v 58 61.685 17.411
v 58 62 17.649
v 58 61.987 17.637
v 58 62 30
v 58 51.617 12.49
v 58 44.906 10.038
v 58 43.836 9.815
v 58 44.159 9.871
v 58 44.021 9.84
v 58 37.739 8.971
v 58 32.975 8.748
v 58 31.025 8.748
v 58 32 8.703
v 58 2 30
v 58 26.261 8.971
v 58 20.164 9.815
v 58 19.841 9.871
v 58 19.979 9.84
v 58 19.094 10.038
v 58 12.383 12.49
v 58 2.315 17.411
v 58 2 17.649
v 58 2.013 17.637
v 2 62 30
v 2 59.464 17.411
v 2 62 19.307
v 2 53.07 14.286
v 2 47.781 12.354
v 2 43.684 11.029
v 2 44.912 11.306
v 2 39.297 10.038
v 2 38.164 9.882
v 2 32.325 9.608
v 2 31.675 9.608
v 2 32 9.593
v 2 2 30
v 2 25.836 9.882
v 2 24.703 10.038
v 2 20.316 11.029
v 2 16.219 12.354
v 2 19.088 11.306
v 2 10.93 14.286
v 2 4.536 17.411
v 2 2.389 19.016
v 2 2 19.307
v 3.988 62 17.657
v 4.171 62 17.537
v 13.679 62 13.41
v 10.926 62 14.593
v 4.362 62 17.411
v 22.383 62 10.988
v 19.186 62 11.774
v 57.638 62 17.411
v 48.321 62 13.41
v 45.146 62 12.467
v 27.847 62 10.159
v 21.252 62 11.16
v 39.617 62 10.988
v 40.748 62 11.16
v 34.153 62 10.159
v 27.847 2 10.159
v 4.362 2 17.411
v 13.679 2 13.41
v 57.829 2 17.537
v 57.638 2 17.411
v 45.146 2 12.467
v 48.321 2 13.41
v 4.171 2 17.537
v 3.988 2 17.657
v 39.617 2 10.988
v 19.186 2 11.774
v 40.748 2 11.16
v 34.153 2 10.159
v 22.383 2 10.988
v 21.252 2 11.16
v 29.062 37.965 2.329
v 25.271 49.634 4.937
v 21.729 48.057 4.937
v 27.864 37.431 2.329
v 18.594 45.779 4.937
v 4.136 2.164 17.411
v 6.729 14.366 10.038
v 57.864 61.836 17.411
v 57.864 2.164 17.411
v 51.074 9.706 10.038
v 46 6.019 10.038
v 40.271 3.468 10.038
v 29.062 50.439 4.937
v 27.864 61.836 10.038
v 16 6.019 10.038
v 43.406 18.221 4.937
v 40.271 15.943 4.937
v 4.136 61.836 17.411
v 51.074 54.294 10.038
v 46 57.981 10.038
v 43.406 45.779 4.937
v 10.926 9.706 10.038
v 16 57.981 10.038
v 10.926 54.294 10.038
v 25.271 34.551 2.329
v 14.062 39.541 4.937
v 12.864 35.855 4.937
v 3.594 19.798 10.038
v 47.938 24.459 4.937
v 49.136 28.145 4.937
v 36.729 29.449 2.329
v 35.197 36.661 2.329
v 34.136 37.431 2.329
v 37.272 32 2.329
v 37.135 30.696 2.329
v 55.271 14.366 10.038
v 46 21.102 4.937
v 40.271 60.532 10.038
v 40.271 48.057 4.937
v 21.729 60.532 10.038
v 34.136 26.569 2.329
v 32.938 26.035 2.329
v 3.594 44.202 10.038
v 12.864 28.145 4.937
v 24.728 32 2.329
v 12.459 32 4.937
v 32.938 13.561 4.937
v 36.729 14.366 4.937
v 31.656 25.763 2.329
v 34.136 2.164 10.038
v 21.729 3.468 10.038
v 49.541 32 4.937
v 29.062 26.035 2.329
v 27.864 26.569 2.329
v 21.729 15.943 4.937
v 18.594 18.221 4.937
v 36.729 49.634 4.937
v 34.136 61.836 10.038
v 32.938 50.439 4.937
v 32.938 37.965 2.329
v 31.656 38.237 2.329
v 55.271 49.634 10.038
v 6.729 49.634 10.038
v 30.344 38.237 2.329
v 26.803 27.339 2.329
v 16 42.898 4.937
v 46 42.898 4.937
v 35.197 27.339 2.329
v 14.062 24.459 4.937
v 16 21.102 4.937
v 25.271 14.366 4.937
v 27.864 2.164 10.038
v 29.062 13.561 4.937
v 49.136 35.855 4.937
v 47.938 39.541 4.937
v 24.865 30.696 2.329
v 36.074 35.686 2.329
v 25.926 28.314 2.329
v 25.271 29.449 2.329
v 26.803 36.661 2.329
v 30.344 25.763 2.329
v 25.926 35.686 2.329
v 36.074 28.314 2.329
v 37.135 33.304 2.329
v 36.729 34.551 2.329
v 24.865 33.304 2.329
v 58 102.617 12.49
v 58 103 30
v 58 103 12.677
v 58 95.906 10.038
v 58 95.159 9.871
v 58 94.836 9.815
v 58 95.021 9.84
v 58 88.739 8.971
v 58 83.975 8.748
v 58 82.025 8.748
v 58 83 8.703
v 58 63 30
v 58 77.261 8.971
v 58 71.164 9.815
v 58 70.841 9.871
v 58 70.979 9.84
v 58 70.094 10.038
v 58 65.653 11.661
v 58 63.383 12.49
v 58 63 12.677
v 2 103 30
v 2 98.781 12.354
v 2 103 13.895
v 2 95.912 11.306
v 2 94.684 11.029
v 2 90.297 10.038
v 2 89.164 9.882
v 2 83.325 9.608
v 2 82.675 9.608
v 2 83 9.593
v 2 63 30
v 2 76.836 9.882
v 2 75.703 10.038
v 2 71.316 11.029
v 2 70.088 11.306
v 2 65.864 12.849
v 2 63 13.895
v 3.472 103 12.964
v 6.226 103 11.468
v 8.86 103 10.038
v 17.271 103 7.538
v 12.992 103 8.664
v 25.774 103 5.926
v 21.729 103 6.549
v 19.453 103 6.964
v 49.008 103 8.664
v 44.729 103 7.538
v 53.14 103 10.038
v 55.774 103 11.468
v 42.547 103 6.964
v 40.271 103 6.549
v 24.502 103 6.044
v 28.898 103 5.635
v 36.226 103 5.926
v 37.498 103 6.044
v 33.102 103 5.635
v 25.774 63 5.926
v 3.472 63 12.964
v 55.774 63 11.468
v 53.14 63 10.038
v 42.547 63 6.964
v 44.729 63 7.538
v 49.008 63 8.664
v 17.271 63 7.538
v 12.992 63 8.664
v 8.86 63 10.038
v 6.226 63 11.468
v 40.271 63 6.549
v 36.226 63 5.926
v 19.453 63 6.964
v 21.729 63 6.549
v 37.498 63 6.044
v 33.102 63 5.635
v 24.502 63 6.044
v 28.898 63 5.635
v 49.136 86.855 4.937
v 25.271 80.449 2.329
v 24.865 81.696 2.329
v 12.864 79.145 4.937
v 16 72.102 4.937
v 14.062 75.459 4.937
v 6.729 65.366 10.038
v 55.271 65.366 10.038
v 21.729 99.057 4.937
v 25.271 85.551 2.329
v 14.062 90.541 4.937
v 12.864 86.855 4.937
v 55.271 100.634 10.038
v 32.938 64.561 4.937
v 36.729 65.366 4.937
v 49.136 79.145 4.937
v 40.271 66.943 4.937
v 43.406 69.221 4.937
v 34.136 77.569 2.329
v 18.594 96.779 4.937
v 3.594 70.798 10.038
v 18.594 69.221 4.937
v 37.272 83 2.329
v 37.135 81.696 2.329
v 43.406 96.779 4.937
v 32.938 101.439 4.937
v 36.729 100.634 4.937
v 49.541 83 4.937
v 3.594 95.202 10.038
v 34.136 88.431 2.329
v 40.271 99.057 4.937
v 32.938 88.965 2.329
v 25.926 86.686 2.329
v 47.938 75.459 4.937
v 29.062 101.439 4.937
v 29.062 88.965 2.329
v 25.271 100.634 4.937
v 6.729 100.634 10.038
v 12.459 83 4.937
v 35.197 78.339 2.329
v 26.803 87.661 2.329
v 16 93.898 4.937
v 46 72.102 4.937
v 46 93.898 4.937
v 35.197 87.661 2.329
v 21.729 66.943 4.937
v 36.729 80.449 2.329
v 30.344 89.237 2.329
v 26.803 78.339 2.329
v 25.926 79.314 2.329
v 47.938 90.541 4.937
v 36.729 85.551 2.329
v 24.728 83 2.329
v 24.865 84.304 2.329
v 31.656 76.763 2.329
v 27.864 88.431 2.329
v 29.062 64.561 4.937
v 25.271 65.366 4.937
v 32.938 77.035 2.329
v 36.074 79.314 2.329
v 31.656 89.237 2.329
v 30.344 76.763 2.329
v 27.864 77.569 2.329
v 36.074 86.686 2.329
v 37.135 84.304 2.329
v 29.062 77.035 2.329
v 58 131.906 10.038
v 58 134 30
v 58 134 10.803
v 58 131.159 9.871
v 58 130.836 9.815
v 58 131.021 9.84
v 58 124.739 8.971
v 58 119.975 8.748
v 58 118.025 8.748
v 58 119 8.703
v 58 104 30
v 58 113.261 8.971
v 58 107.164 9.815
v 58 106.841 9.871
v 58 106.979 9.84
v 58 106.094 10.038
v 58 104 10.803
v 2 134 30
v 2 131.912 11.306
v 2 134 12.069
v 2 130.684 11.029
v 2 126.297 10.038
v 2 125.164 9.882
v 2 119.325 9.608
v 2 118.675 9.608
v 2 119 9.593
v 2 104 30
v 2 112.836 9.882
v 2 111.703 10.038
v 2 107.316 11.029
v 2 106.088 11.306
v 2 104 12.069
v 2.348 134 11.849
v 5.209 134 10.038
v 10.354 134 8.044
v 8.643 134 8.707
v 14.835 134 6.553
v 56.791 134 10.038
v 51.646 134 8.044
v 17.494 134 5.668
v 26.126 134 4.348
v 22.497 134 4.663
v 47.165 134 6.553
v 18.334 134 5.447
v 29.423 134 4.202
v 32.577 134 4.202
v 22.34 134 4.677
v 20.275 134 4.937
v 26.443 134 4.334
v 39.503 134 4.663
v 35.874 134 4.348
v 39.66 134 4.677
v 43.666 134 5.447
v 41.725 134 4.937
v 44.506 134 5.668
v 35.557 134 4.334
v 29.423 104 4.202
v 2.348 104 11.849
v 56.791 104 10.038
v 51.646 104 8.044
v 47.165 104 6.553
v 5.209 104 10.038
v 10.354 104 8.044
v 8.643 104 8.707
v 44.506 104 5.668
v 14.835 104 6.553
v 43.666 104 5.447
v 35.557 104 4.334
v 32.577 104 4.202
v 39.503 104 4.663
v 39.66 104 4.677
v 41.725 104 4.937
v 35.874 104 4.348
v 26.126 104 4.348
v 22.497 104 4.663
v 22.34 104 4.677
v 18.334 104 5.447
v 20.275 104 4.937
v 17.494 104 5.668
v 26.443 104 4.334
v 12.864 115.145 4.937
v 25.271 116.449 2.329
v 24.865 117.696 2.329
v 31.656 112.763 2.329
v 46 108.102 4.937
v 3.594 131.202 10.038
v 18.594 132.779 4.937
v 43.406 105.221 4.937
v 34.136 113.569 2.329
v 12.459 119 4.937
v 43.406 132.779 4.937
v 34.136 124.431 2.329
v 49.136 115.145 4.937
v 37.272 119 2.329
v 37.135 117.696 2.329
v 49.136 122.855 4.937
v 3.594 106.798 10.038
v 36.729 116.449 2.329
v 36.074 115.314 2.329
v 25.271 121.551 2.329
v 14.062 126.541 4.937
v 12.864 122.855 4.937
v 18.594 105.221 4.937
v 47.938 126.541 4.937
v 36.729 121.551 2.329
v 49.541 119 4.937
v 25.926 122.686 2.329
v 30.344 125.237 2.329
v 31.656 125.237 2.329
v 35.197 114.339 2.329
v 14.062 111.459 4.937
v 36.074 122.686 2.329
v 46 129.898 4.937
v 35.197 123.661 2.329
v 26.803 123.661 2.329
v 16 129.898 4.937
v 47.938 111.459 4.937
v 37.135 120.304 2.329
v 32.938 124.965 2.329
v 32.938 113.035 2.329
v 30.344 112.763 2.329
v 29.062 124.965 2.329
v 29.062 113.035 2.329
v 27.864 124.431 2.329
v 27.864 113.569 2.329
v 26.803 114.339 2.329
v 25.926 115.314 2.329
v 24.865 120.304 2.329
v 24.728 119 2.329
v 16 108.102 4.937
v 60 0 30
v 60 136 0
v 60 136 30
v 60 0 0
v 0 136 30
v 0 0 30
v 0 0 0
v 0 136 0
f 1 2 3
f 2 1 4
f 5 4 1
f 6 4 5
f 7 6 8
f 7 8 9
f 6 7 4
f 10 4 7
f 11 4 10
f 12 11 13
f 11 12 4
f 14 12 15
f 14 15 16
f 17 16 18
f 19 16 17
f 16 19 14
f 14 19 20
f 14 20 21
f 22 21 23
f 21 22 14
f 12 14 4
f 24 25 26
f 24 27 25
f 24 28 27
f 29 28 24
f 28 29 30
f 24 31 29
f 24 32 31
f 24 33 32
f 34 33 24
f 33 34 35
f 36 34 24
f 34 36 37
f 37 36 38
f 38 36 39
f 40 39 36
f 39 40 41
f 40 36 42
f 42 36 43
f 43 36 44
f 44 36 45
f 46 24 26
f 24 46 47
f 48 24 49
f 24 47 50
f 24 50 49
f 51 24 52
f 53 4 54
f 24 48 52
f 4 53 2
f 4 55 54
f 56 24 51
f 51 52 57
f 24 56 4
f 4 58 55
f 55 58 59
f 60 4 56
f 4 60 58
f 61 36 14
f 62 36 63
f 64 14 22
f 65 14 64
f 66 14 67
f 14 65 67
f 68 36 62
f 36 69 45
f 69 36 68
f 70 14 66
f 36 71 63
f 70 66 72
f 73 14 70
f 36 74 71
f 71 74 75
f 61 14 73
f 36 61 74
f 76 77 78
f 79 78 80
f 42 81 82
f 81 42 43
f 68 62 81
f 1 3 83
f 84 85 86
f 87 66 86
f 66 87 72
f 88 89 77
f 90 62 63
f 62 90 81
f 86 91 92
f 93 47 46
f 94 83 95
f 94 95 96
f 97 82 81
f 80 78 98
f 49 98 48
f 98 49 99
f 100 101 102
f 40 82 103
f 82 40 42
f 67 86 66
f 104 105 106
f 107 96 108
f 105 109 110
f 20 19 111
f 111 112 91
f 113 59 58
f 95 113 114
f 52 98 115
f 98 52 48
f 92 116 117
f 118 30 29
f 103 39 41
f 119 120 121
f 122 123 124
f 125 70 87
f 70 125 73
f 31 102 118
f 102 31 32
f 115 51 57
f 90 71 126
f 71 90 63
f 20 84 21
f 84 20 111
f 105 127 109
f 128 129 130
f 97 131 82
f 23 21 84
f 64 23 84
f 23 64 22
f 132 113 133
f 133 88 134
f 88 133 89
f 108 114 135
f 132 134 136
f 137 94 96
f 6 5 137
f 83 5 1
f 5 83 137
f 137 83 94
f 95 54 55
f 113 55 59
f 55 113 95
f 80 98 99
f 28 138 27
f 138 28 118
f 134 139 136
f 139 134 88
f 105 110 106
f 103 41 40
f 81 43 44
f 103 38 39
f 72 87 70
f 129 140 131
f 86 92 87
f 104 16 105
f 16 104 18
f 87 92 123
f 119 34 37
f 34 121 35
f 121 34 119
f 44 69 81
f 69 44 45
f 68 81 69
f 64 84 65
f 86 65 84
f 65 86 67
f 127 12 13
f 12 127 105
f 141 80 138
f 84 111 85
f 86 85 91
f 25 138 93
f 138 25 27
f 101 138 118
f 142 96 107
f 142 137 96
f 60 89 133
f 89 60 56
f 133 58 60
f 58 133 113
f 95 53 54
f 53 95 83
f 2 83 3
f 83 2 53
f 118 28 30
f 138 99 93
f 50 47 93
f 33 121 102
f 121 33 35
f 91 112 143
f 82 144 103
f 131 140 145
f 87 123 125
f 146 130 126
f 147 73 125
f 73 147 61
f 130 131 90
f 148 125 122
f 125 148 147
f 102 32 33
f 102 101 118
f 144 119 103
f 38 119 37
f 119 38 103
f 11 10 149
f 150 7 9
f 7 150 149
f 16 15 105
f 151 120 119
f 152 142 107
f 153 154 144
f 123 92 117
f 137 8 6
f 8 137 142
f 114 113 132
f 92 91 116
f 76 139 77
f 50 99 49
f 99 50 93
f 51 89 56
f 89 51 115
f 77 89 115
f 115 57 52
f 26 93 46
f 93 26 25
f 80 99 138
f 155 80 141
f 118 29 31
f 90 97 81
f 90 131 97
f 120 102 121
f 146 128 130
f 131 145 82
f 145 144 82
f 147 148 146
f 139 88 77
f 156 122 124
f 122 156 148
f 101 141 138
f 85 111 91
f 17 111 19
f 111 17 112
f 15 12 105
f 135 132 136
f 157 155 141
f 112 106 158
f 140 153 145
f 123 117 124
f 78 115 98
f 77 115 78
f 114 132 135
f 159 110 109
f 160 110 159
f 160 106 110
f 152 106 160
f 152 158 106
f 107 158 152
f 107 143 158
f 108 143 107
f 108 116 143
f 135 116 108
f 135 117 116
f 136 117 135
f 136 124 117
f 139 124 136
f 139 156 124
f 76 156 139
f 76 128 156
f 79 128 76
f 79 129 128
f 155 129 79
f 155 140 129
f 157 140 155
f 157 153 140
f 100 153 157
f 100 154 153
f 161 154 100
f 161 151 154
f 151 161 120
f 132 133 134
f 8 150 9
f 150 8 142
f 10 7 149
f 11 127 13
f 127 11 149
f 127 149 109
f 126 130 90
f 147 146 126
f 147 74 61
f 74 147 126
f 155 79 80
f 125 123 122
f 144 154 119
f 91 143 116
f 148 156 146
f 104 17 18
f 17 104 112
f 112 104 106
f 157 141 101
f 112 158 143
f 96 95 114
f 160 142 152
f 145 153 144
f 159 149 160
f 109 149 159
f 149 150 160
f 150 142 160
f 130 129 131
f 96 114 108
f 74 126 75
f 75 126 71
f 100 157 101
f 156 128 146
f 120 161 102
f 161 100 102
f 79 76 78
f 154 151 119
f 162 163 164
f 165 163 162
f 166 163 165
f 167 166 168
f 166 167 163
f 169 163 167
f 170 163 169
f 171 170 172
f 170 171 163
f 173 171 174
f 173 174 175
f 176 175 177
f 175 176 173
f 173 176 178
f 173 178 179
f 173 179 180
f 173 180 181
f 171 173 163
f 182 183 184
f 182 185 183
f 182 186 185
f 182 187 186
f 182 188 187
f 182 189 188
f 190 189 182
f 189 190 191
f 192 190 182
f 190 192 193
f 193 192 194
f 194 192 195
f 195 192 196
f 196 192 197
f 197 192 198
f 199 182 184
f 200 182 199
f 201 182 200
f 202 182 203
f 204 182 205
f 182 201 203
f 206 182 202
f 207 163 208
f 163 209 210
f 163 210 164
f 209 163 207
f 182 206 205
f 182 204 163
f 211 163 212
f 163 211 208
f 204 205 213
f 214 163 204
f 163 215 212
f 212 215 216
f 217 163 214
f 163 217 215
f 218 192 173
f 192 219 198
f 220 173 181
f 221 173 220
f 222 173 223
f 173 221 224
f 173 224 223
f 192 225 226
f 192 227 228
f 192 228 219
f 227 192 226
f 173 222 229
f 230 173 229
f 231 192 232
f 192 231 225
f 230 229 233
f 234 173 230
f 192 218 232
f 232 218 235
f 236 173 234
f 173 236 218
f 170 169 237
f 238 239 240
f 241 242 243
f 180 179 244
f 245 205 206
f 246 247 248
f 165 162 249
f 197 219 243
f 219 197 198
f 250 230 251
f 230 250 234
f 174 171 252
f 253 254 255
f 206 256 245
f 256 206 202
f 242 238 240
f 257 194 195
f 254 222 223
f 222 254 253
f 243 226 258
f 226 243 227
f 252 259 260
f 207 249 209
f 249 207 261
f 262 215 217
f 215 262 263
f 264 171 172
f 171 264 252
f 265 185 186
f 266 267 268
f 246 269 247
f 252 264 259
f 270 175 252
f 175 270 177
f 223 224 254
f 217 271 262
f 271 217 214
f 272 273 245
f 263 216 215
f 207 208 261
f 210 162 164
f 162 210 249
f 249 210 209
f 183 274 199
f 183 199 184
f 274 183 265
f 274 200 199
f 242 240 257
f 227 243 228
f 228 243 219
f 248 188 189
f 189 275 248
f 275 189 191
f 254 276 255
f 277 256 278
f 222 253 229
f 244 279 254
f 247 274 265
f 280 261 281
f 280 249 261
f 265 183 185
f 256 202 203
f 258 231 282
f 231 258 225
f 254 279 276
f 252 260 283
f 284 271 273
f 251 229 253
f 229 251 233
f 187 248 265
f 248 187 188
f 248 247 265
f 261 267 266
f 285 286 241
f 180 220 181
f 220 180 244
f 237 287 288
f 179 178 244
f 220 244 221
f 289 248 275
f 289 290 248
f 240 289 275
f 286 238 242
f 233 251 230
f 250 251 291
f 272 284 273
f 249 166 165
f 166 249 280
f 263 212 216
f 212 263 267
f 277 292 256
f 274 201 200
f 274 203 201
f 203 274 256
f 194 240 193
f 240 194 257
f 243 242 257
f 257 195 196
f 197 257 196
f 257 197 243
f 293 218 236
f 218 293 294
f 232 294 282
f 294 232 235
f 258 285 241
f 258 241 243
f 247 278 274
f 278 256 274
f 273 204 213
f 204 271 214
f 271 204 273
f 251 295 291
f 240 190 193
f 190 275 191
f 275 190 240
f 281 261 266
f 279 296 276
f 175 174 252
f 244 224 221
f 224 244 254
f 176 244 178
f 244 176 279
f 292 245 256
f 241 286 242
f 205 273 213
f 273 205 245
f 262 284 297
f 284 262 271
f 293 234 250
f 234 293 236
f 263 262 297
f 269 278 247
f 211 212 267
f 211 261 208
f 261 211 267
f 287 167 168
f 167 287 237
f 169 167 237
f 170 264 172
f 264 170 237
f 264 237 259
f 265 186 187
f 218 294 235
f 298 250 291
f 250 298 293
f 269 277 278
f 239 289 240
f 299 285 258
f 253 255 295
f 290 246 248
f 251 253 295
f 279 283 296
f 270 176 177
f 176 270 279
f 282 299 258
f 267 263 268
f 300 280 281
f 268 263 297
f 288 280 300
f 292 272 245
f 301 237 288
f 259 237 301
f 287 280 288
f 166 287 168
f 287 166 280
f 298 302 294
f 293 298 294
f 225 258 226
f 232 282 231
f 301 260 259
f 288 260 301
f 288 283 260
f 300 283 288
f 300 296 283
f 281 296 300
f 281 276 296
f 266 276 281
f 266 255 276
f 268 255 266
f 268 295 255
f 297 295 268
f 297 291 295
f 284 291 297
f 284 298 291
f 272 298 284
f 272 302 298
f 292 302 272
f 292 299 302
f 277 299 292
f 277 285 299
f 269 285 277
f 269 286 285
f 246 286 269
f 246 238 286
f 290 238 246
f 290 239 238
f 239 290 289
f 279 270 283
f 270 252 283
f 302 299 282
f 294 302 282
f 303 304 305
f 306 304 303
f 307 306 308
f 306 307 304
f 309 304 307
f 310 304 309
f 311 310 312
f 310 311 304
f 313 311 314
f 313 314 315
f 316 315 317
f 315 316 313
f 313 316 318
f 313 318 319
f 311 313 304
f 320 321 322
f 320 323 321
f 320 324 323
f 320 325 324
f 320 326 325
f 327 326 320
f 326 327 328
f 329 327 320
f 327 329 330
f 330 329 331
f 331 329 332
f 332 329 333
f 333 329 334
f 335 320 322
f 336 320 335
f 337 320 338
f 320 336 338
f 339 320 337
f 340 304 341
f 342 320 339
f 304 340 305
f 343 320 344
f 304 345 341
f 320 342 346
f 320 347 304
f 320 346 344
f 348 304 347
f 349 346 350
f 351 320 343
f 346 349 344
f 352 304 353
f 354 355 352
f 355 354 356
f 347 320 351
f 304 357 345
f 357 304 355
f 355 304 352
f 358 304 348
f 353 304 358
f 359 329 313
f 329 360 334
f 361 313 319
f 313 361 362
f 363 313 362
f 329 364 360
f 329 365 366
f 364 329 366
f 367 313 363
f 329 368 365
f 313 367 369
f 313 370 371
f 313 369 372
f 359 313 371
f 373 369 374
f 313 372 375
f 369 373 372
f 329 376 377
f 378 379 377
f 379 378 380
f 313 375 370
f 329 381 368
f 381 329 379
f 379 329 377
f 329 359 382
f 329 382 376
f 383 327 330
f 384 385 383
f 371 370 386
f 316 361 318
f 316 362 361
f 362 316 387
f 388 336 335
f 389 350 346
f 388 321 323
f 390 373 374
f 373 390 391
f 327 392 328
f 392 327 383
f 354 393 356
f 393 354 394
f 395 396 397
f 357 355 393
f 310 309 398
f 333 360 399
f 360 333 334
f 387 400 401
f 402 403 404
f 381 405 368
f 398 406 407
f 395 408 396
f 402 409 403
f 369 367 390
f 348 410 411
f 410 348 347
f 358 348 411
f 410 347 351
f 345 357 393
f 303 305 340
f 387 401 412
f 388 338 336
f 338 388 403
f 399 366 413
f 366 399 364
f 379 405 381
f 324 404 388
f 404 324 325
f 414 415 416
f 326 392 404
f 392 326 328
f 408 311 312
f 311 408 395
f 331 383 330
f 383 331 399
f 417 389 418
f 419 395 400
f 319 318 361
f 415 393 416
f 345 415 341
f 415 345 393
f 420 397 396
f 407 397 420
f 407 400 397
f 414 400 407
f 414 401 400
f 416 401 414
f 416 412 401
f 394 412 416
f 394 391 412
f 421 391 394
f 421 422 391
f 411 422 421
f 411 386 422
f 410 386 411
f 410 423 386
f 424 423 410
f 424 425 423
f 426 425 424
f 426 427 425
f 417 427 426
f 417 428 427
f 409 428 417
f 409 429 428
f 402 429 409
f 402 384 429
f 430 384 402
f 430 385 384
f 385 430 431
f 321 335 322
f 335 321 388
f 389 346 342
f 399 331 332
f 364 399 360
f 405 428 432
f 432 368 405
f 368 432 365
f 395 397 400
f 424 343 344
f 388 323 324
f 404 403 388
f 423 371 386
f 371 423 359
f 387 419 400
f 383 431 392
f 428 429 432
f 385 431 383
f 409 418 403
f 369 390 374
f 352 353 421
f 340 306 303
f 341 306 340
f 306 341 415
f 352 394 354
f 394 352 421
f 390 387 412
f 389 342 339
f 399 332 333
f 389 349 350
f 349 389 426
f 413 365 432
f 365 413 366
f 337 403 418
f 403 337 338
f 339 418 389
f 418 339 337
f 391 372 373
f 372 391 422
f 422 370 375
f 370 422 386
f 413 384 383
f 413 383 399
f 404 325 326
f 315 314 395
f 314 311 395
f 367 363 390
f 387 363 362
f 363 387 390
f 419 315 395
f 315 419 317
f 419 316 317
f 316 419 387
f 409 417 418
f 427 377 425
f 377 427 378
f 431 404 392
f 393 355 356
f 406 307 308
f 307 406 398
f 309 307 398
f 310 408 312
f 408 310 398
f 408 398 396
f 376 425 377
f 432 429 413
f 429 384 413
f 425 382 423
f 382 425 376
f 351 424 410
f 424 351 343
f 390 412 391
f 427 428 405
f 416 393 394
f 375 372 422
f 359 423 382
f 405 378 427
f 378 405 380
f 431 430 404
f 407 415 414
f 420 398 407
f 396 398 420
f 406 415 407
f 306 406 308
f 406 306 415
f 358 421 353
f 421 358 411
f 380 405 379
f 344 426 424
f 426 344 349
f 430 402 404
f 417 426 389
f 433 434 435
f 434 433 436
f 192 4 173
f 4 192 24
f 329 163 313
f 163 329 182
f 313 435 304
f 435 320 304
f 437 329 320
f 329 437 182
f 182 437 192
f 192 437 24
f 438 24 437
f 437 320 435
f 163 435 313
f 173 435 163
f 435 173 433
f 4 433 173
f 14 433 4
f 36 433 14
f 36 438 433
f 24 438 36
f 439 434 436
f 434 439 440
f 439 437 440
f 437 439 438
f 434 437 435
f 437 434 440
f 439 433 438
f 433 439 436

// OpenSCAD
// This is a first attempt for a storage solution for resource tokens. 

// Input parameter
width = 60;
height = 30;
outerThickness = 2;
pocketSeparatorThickness = 1;
pockets = [60, 40, 30];

// main
function sumv(v, i, s = 0) = (i == s ? v[i]  : v[i] + sumv(v, i-1, s));
function pocketStart(v, i) = (i == 0 ? outerThickness  : v[i-1] + pocketSeparatorThickness + pocketStart(v, i-1));

hIndex = len(pockets) - 1;
length = sumv(pockets, hIndex) + (2 * outerThickness) + (hIndex * pocketSeparatorThickness);

difference() {
    cube([width, length, height]);
    // pockets for resources
    for (i=[0:hIndex]) {
        translate([outerThickness, pocketStart(pockets, i), 2])
            intersection() {
                cube([(width - 2 * outerThickness), pockets[i], height + 2]);
                translate([(width - 2) / 2, pockets[i] / 2, max(width, pockets[i])])
                    sphere(r = max(width, pockets[i]));
            }
    }
}
